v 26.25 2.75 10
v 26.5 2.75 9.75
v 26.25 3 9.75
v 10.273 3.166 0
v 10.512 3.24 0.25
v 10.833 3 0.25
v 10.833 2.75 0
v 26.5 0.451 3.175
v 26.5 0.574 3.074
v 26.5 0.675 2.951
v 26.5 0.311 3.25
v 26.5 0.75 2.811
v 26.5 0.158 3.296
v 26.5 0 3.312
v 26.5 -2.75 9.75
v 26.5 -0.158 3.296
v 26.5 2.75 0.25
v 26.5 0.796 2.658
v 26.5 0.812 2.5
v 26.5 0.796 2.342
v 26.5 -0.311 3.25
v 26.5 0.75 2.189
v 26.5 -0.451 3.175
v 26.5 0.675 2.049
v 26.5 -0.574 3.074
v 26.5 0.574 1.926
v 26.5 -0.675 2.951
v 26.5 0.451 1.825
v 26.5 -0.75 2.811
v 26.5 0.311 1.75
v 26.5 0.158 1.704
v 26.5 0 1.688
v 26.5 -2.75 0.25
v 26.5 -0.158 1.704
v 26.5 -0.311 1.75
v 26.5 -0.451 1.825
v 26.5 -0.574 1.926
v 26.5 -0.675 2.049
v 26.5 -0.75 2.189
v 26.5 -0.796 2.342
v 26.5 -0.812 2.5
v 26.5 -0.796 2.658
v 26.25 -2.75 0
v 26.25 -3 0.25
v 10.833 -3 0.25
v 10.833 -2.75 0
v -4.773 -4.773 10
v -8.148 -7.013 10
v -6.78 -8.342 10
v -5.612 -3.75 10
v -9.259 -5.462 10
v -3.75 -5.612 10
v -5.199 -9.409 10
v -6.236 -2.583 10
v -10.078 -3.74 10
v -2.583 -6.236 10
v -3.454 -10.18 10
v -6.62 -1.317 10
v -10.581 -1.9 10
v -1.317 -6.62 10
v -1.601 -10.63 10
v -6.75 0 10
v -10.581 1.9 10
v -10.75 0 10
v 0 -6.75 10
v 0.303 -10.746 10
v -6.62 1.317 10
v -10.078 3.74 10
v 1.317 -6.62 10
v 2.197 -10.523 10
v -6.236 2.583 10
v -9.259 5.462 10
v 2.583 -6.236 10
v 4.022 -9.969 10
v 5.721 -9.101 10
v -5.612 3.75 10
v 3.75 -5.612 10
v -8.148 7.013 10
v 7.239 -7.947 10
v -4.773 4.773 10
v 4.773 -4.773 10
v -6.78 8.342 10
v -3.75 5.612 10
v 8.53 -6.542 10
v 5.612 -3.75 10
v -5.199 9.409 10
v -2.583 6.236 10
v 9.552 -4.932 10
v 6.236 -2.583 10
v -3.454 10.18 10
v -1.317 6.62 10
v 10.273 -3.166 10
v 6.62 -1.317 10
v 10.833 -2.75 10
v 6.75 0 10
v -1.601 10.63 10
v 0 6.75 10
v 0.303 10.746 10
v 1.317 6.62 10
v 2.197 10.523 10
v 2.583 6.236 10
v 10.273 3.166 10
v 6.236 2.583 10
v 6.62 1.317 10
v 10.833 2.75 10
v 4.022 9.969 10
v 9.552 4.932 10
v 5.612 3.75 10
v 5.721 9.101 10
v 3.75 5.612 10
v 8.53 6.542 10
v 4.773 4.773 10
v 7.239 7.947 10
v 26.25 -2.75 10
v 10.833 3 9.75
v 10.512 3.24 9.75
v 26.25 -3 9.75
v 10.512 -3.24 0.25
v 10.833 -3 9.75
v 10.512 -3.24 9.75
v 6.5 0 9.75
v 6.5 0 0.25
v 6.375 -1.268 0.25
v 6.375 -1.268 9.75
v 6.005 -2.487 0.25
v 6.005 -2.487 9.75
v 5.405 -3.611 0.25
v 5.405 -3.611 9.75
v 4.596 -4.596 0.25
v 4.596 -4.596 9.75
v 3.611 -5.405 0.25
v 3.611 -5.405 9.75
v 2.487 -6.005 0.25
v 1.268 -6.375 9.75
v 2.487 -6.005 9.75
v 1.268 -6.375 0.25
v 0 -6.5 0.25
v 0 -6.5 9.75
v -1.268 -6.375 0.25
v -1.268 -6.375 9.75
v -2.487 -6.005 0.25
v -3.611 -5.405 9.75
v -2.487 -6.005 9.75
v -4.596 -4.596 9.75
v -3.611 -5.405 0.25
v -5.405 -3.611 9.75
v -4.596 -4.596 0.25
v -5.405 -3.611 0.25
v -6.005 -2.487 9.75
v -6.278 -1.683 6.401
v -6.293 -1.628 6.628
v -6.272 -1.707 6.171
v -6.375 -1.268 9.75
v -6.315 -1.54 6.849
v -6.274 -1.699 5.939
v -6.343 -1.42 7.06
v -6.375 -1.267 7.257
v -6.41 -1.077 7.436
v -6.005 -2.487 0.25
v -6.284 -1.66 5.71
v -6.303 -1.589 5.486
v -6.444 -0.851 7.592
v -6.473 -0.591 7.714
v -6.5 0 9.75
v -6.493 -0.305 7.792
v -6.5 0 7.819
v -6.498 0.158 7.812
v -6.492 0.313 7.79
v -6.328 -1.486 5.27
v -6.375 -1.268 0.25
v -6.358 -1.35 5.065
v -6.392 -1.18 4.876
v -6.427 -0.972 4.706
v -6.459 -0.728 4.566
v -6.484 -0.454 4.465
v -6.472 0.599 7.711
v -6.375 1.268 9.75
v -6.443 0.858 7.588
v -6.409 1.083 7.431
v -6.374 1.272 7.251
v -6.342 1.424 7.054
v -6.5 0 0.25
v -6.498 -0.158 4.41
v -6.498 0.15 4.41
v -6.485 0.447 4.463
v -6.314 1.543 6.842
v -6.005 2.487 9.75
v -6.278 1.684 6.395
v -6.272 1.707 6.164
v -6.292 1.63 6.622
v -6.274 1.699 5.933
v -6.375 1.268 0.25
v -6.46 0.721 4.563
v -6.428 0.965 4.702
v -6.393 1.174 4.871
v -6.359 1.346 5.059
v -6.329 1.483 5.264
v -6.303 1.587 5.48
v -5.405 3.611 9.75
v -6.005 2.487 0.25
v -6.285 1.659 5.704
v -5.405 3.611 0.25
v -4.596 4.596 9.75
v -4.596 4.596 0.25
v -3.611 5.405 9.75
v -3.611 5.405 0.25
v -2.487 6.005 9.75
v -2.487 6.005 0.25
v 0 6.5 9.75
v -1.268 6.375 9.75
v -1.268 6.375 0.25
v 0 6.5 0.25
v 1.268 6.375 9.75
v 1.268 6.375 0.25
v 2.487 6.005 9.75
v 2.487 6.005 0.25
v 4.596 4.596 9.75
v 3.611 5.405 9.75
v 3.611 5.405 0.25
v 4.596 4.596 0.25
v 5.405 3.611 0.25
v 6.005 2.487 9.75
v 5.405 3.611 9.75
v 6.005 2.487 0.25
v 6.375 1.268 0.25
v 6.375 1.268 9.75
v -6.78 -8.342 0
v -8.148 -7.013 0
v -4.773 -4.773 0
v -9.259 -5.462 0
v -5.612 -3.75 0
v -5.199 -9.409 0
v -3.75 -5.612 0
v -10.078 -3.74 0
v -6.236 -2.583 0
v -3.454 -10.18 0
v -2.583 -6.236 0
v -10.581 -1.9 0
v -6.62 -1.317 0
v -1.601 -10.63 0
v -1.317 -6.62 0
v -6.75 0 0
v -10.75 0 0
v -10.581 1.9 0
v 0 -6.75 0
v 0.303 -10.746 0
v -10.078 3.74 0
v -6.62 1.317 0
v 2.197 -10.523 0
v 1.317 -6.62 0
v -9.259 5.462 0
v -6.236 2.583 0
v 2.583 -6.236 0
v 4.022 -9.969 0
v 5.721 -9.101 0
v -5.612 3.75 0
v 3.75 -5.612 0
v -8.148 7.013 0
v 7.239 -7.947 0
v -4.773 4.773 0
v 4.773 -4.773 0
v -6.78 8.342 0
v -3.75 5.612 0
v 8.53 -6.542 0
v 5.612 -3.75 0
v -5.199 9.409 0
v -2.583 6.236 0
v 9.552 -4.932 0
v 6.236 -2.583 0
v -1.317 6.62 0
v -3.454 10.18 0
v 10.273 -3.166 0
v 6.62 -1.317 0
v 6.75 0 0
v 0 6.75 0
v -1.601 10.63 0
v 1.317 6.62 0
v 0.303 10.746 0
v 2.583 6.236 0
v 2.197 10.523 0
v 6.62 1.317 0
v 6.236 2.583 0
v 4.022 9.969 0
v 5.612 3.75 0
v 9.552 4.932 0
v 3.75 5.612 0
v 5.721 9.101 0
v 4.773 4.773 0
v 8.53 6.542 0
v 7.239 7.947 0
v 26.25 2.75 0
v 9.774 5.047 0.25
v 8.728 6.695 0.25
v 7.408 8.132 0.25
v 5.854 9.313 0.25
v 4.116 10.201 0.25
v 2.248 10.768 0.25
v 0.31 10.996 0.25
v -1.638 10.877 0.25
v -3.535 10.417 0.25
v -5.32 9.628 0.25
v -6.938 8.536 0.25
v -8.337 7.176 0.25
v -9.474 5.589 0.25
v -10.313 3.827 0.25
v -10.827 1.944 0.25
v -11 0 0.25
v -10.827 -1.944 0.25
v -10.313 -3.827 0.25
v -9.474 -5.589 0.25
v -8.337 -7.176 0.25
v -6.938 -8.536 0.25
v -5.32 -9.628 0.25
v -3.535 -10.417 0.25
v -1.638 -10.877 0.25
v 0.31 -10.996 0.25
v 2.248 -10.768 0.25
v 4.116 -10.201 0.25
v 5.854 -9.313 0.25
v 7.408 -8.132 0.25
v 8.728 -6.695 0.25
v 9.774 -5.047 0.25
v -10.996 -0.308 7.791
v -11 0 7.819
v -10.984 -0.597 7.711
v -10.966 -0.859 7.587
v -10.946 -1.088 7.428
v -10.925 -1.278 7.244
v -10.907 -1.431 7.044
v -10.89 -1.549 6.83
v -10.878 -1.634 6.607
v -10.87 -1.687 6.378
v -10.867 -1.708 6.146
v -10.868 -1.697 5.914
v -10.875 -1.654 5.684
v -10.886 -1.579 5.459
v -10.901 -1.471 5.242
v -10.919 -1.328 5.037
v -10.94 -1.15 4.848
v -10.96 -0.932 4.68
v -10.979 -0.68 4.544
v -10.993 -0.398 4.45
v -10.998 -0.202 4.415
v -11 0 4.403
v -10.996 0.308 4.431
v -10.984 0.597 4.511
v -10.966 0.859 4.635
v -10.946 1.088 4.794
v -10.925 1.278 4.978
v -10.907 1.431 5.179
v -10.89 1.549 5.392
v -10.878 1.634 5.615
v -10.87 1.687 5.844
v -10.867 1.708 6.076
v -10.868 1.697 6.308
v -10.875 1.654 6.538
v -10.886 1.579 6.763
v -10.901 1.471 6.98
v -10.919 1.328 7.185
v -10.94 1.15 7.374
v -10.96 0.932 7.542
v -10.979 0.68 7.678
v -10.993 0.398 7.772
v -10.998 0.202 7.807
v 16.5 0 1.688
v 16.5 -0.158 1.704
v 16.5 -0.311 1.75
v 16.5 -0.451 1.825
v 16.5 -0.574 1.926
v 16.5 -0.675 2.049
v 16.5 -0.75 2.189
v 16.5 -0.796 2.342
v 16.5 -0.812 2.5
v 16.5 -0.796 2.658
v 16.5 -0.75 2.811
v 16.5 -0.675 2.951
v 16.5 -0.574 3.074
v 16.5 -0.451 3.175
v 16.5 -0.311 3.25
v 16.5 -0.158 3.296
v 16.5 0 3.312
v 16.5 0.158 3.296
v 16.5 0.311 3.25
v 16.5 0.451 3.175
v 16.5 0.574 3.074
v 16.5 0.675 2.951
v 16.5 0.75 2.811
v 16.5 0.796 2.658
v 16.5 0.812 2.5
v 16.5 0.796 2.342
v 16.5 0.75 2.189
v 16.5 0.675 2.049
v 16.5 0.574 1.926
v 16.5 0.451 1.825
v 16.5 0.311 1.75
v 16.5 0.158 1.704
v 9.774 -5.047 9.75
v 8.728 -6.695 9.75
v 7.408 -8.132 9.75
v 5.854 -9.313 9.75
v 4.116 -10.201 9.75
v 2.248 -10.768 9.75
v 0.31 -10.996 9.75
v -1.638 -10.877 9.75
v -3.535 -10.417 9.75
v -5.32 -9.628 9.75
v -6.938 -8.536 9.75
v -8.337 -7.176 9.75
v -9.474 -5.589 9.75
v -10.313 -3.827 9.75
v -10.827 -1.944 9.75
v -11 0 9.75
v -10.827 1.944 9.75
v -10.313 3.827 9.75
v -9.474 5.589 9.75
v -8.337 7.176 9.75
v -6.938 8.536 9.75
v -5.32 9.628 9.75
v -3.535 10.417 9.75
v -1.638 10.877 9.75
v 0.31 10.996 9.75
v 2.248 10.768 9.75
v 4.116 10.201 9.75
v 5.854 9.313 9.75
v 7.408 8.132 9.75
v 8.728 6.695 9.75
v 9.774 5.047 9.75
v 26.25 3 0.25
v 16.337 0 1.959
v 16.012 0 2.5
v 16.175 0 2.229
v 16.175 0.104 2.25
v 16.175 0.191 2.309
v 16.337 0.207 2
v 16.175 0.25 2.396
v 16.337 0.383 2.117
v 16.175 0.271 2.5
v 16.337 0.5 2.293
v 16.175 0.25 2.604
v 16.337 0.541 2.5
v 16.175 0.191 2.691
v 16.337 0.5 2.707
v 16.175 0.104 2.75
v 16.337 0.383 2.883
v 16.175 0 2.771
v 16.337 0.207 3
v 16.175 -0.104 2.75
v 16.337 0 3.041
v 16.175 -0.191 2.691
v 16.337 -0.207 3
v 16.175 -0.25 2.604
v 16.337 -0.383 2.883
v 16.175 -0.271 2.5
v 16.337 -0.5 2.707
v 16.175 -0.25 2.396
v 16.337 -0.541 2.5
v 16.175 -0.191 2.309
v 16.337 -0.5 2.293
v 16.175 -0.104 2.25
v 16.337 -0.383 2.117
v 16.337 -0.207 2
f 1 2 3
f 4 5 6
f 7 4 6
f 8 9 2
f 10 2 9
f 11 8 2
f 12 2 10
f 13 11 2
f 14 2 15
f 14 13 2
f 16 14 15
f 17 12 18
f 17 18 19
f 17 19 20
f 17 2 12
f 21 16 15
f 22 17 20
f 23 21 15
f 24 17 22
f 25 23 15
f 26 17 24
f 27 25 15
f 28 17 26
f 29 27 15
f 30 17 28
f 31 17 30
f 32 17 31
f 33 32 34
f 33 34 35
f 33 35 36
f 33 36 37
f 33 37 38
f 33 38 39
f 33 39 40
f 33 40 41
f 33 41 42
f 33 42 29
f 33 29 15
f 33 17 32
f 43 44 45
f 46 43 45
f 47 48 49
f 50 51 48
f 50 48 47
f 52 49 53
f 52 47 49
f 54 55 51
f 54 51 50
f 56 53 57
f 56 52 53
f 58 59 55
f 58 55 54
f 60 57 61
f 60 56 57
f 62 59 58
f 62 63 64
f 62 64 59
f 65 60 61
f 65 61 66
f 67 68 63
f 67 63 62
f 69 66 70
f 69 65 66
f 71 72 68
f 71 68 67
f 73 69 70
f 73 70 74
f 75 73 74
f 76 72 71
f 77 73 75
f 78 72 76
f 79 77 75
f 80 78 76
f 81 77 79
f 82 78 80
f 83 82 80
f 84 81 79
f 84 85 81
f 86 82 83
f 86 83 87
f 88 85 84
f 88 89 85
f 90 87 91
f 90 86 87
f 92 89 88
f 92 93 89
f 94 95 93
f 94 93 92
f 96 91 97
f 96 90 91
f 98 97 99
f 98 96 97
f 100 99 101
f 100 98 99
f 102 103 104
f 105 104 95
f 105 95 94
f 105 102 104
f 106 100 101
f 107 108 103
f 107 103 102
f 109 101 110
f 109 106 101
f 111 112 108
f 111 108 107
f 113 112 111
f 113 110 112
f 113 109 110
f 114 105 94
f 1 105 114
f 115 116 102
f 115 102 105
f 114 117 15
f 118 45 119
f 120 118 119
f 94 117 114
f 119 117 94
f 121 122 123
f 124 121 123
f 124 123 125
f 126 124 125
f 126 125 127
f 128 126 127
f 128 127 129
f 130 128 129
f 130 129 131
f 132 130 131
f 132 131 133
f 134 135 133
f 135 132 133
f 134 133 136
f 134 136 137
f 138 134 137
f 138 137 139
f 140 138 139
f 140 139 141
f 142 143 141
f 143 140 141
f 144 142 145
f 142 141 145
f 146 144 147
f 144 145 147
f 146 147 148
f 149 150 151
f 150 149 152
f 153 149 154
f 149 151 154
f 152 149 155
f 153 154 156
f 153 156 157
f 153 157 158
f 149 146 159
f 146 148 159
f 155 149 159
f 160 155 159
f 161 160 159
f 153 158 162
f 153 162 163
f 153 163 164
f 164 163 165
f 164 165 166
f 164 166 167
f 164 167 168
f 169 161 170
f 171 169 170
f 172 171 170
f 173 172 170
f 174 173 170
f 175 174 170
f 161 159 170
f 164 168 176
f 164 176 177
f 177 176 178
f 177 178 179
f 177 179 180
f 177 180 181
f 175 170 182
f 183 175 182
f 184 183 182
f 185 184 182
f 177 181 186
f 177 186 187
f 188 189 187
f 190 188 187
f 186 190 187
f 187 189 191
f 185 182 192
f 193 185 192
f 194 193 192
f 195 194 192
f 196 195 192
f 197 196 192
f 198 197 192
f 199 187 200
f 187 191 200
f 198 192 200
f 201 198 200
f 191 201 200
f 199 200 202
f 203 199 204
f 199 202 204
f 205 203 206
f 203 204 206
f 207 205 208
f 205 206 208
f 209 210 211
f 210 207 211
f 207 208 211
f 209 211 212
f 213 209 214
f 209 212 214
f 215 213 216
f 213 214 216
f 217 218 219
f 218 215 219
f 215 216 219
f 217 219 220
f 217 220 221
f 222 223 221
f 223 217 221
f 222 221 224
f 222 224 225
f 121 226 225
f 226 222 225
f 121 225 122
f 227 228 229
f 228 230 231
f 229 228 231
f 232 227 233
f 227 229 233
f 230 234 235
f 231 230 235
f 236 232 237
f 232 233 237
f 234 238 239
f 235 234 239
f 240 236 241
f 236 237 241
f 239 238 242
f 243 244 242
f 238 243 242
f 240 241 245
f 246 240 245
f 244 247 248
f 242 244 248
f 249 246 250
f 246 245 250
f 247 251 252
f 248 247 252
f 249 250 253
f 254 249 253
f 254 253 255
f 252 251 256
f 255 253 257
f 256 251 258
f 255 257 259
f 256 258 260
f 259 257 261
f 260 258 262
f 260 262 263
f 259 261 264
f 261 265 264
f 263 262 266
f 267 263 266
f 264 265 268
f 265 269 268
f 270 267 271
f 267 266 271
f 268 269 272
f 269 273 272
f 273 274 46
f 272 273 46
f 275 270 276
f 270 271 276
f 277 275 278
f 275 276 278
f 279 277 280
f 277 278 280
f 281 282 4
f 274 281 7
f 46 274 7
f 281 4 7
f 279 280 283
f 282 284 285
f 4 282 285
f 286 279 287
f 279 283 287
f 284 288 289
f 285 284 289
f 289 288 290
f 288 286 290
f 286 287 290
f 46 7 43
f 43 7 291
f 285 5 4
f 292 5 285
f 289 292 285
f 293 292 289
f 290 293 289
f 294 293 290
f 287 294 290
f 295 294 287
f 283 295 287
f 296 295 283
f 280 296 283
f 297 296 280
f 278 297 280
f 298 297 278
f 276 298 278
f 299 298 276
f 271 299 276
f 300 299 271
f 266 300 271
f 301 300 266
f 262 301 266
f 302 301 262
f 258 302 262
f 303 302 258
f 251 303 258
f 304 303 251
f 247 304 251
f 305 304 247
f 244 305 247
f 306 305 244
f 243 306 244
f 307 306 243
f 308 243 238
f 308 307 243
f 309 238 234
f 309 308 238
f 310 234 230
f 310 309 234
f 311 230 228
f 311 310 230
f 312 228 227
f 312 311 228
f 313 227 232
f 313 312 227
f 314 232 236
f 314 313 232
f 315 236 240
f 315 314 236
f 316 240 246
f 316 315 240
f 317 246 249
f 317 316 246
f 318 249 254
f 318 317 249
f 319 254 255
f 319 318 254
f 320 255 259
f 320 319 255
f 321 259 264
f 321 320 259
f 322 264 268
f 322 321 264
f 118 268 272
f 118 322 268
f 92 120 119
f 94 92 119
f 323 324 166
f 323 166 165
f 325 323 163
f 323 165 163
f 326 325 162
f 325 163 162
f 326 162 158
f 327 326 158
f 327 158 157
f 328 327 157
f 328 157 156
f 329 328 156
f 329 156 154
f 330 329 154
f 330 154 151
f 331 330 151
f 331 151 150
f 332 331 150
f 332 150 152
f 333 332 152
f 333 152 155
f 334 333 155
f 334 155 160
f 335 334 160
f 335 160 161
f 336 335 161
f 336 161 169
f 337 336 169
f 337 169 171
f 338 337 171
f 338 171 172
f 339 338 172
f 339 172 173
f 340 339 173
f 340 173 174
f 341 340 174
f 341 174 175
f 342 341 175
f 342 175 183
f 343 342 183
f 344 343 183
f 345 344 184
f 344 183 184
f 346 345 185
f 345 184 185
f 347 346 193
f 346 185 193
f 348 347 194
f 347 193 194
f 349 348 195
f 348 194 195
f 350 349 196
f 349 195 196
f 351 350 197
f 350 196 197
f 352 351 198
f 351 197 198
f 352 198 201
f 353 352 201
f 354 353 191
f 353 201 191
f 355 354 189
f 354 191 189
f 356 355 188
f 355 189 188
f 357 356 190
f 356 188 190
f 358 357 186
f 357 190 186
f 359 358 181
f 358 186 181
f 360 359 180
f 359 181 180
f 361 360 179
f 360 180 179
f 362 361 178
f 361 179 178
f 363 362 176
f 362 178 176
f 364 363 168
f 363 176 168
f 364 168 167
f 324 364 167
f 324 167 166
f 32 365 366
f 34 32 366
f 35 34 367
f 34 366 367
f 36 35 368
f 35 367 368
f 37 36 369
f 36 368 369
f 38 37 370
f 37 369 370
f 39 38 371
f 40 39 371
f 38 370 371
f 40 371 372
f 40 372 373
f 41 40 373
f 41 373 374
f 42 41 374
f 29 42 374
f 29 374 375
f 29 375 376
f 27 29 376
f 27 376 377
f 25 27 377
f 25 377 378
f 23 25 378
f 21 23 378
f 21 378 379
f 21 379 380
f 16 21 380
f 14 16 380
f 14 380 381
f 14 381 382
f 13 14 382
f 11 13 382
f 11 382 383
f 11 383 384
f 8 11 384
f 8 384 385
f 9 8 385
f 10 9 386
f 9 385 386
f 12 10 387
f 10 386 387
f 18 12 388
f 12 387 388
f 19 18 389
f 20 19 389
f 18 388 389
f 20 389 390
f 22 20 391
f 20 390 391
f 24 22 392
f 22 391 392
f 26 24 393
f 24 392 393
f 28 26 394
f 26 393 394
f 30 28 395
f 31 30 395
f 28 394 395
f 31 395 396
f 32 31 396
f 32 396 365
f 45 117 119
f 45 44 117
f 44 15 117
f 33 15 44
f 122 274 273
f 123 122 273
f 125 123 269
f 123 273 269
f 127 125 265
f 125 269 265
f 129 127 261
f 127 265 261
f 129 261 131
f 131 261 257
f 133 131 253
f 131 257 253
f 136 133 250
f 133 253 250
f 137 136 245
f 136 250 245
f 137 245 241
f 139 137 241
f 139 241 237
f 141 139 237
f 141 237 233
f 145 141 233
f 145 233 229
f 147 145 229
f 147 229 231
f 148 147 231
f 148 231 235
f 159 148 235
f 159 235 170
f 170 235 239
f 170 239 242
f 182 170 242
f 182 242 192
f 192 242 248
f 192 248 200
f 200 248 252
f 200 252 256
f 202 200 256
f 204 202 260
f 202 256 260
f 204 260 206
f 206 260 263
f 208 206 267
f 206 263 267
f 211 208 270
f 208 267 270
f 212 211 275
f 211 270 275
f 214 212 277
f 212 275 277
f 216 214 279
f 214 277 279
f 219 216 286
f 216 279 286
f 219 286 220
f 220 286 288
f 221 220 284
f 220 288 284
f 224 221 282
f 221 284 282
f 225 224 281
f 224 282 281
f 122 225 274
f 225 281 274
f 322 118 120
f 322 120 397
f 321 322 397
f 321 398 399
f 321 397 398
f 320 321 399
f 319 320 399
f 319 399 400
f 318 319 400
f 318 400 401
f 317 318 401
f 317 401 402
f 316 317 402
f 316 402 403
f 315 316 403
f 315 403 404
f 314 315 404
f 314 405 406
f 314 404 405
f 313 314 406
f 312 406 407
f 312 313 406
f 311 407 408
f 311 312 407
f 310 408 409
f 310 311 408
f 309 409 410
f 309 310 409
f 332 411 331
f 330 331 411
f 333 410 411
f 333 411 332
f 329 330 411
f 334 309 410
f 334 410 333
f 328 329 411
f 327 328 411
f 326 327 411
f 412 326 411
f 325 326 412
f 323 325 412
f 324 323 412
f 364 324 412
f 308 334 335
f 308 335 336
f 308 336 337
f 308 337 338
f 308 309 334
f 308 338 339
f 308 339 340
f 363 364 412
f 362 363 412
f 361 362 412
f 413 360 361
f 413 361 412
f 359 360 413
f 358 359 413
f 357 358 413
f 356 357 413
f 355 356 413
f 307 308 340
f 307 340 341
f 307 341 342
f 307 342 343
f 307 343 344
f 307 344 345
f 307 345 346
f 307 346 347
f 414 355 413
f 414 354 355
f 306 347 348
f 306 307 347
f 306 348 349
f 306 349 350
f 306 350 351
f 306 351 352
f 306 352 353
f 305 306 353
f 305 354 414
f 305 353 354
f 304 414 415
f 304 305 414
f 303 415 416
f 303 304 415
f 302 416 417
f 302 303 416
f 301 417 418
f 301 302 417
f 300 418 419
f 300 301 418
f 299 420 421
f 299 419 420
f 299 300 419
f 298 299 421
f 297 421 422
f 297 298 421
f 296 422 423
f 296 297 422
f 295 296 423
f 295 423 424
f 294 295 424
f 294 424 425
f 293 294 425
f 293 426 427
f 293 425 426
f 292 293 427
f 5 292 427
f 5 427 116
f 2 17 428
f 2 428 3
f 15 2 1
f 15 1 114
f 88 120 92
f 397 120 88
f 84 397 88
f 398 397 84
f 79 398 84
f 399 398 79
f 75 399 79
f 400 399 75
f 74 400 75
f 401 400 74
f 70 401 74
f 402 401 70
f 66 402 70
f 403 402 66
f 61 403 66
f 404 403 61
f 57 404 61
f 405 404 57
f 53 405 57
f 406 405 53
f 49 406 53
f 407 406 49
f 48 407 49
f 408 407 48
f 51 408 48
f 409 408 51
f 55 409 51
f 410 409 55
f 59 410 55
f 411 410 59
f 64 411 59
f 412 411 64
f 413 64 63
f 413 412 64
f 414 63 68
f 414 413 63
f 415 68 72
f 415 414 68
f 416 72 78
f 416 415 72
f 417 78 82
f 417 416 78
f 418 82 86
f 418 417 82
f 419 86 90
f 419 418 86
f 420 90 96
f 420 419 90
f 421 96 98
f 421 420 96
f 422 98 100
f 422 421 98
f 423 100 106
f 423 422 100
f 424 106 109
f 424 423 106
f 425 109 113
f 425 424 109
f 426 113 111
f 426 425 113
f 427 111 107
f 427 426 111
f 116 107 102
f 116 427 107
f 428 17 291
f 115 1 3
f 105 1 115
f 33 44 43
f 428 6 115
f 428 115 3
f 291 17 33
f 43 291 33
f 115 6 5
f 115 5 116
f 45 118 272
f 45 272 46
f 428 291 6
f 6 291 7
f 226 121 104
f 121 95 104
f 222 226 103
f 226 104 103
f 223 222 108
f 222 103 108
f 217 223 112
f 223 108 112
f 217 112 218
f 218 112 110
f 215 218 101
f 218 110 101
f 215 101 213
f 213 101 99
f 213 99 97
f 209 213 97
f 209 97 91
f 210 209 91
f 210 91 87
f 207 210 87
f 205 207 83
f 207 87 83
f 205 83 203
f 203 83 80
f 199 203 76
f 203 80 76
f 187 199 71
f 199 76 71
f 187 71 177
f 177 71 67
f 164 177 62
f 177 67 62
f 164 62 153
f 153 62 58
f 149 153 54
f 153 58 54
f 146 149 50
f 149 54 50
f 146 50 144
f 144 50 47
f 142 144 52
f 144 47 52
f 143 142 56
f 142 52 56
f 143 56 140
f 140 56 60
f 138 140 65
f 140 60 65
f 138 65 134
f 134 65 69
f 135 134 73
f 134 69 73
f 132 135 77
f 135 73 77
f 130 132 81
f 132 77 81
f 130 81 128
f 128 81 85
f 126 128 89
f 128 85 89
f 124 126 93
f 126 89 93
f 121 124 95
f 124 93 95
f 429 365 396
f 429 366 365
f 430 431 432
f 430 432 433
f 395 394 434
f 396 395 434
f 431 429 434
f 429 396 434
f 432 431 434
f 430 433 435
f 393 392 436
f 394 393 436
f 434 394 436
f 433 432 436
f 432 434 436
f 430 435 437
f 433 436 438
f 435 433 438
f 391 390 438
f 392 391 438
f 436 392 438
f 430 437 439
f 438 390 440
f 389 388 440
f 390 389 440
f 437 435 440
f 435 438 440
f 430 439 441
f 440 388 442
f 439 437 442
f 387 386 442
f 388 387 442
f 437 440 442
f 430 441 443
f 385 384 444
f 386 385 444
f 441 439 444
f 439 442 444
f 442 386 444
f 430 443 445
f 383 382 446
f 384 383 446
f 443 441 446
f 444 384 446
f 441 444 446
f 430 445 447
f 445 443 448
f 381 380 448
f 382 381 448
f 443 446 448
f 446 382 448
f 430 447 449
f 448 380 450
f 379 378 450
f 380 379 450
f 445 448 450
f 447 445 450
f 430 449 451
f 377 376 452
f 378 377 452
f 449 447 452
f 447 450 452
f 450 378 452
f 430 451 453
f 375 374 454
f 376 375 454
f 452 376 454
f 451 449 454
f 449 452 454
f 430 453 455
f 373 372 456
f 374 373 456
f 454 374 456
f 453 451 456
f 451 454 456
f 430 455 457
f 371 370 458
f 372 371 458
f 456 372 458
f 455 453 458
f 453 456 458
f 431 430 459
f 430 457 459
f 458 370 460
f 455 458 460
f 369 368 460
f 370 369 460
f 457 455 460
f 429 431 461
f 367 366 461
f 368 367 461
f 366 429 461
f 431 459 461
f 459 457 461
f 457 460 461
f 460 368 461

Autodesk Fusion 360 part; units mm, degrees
sketch "Sketch1" plane through (0, 0, 0) normal (0, 0, 1) x (1, 0, 0)
  circle A0 centre (0, 0) radius 6.5
  circle A1 centre (0, 0) radius 11
  line L0 (0, 0) -> (9, 0) construction
  line L1 (0, 0) -> (6.5, 0)
  line L2 (6.5, 0) -> (6.5, 3)
  line L3 (6.5, 3) -> (26.5, 3)
  line L4 (26.5, 3) -> (26.5, -3)
  line L5 (26.5, -3) -> (6.5, -3)
  line L6 (6.5, -3) -> (6.5, 3)
  dimension "d1" = 13
  dimension "d2" = 22
  dimension "d21" = 3
  dimension "d22" = 20
  dimension "d23" = 6
extrude "Extrude1" add sketch "Sketch1" along normal blind 10
hole "Hole1" at (26.5, 0, 2.5) direction (-1, 0, 0) diameter 1.623 depth 10 tip angle 118
hole "Hole3" at (-11, 0, 6.1111) direction (1, 0, 0) diameter 3.416 depth 10 tip angle 118
chamfer "Chamfer1" distance 0.25 angle 45 4 edges at (10.583, -3, 5) (10.583, 3, 5) (26.5, -3, 5) (26.5, 3, 5) 2 faces at (15.8887, -1, 10) (15.8887, -1, 0)
equation "d16 = ( 6 / 2 ) * 1 mm"
equation "d21 = d23 / 2"
